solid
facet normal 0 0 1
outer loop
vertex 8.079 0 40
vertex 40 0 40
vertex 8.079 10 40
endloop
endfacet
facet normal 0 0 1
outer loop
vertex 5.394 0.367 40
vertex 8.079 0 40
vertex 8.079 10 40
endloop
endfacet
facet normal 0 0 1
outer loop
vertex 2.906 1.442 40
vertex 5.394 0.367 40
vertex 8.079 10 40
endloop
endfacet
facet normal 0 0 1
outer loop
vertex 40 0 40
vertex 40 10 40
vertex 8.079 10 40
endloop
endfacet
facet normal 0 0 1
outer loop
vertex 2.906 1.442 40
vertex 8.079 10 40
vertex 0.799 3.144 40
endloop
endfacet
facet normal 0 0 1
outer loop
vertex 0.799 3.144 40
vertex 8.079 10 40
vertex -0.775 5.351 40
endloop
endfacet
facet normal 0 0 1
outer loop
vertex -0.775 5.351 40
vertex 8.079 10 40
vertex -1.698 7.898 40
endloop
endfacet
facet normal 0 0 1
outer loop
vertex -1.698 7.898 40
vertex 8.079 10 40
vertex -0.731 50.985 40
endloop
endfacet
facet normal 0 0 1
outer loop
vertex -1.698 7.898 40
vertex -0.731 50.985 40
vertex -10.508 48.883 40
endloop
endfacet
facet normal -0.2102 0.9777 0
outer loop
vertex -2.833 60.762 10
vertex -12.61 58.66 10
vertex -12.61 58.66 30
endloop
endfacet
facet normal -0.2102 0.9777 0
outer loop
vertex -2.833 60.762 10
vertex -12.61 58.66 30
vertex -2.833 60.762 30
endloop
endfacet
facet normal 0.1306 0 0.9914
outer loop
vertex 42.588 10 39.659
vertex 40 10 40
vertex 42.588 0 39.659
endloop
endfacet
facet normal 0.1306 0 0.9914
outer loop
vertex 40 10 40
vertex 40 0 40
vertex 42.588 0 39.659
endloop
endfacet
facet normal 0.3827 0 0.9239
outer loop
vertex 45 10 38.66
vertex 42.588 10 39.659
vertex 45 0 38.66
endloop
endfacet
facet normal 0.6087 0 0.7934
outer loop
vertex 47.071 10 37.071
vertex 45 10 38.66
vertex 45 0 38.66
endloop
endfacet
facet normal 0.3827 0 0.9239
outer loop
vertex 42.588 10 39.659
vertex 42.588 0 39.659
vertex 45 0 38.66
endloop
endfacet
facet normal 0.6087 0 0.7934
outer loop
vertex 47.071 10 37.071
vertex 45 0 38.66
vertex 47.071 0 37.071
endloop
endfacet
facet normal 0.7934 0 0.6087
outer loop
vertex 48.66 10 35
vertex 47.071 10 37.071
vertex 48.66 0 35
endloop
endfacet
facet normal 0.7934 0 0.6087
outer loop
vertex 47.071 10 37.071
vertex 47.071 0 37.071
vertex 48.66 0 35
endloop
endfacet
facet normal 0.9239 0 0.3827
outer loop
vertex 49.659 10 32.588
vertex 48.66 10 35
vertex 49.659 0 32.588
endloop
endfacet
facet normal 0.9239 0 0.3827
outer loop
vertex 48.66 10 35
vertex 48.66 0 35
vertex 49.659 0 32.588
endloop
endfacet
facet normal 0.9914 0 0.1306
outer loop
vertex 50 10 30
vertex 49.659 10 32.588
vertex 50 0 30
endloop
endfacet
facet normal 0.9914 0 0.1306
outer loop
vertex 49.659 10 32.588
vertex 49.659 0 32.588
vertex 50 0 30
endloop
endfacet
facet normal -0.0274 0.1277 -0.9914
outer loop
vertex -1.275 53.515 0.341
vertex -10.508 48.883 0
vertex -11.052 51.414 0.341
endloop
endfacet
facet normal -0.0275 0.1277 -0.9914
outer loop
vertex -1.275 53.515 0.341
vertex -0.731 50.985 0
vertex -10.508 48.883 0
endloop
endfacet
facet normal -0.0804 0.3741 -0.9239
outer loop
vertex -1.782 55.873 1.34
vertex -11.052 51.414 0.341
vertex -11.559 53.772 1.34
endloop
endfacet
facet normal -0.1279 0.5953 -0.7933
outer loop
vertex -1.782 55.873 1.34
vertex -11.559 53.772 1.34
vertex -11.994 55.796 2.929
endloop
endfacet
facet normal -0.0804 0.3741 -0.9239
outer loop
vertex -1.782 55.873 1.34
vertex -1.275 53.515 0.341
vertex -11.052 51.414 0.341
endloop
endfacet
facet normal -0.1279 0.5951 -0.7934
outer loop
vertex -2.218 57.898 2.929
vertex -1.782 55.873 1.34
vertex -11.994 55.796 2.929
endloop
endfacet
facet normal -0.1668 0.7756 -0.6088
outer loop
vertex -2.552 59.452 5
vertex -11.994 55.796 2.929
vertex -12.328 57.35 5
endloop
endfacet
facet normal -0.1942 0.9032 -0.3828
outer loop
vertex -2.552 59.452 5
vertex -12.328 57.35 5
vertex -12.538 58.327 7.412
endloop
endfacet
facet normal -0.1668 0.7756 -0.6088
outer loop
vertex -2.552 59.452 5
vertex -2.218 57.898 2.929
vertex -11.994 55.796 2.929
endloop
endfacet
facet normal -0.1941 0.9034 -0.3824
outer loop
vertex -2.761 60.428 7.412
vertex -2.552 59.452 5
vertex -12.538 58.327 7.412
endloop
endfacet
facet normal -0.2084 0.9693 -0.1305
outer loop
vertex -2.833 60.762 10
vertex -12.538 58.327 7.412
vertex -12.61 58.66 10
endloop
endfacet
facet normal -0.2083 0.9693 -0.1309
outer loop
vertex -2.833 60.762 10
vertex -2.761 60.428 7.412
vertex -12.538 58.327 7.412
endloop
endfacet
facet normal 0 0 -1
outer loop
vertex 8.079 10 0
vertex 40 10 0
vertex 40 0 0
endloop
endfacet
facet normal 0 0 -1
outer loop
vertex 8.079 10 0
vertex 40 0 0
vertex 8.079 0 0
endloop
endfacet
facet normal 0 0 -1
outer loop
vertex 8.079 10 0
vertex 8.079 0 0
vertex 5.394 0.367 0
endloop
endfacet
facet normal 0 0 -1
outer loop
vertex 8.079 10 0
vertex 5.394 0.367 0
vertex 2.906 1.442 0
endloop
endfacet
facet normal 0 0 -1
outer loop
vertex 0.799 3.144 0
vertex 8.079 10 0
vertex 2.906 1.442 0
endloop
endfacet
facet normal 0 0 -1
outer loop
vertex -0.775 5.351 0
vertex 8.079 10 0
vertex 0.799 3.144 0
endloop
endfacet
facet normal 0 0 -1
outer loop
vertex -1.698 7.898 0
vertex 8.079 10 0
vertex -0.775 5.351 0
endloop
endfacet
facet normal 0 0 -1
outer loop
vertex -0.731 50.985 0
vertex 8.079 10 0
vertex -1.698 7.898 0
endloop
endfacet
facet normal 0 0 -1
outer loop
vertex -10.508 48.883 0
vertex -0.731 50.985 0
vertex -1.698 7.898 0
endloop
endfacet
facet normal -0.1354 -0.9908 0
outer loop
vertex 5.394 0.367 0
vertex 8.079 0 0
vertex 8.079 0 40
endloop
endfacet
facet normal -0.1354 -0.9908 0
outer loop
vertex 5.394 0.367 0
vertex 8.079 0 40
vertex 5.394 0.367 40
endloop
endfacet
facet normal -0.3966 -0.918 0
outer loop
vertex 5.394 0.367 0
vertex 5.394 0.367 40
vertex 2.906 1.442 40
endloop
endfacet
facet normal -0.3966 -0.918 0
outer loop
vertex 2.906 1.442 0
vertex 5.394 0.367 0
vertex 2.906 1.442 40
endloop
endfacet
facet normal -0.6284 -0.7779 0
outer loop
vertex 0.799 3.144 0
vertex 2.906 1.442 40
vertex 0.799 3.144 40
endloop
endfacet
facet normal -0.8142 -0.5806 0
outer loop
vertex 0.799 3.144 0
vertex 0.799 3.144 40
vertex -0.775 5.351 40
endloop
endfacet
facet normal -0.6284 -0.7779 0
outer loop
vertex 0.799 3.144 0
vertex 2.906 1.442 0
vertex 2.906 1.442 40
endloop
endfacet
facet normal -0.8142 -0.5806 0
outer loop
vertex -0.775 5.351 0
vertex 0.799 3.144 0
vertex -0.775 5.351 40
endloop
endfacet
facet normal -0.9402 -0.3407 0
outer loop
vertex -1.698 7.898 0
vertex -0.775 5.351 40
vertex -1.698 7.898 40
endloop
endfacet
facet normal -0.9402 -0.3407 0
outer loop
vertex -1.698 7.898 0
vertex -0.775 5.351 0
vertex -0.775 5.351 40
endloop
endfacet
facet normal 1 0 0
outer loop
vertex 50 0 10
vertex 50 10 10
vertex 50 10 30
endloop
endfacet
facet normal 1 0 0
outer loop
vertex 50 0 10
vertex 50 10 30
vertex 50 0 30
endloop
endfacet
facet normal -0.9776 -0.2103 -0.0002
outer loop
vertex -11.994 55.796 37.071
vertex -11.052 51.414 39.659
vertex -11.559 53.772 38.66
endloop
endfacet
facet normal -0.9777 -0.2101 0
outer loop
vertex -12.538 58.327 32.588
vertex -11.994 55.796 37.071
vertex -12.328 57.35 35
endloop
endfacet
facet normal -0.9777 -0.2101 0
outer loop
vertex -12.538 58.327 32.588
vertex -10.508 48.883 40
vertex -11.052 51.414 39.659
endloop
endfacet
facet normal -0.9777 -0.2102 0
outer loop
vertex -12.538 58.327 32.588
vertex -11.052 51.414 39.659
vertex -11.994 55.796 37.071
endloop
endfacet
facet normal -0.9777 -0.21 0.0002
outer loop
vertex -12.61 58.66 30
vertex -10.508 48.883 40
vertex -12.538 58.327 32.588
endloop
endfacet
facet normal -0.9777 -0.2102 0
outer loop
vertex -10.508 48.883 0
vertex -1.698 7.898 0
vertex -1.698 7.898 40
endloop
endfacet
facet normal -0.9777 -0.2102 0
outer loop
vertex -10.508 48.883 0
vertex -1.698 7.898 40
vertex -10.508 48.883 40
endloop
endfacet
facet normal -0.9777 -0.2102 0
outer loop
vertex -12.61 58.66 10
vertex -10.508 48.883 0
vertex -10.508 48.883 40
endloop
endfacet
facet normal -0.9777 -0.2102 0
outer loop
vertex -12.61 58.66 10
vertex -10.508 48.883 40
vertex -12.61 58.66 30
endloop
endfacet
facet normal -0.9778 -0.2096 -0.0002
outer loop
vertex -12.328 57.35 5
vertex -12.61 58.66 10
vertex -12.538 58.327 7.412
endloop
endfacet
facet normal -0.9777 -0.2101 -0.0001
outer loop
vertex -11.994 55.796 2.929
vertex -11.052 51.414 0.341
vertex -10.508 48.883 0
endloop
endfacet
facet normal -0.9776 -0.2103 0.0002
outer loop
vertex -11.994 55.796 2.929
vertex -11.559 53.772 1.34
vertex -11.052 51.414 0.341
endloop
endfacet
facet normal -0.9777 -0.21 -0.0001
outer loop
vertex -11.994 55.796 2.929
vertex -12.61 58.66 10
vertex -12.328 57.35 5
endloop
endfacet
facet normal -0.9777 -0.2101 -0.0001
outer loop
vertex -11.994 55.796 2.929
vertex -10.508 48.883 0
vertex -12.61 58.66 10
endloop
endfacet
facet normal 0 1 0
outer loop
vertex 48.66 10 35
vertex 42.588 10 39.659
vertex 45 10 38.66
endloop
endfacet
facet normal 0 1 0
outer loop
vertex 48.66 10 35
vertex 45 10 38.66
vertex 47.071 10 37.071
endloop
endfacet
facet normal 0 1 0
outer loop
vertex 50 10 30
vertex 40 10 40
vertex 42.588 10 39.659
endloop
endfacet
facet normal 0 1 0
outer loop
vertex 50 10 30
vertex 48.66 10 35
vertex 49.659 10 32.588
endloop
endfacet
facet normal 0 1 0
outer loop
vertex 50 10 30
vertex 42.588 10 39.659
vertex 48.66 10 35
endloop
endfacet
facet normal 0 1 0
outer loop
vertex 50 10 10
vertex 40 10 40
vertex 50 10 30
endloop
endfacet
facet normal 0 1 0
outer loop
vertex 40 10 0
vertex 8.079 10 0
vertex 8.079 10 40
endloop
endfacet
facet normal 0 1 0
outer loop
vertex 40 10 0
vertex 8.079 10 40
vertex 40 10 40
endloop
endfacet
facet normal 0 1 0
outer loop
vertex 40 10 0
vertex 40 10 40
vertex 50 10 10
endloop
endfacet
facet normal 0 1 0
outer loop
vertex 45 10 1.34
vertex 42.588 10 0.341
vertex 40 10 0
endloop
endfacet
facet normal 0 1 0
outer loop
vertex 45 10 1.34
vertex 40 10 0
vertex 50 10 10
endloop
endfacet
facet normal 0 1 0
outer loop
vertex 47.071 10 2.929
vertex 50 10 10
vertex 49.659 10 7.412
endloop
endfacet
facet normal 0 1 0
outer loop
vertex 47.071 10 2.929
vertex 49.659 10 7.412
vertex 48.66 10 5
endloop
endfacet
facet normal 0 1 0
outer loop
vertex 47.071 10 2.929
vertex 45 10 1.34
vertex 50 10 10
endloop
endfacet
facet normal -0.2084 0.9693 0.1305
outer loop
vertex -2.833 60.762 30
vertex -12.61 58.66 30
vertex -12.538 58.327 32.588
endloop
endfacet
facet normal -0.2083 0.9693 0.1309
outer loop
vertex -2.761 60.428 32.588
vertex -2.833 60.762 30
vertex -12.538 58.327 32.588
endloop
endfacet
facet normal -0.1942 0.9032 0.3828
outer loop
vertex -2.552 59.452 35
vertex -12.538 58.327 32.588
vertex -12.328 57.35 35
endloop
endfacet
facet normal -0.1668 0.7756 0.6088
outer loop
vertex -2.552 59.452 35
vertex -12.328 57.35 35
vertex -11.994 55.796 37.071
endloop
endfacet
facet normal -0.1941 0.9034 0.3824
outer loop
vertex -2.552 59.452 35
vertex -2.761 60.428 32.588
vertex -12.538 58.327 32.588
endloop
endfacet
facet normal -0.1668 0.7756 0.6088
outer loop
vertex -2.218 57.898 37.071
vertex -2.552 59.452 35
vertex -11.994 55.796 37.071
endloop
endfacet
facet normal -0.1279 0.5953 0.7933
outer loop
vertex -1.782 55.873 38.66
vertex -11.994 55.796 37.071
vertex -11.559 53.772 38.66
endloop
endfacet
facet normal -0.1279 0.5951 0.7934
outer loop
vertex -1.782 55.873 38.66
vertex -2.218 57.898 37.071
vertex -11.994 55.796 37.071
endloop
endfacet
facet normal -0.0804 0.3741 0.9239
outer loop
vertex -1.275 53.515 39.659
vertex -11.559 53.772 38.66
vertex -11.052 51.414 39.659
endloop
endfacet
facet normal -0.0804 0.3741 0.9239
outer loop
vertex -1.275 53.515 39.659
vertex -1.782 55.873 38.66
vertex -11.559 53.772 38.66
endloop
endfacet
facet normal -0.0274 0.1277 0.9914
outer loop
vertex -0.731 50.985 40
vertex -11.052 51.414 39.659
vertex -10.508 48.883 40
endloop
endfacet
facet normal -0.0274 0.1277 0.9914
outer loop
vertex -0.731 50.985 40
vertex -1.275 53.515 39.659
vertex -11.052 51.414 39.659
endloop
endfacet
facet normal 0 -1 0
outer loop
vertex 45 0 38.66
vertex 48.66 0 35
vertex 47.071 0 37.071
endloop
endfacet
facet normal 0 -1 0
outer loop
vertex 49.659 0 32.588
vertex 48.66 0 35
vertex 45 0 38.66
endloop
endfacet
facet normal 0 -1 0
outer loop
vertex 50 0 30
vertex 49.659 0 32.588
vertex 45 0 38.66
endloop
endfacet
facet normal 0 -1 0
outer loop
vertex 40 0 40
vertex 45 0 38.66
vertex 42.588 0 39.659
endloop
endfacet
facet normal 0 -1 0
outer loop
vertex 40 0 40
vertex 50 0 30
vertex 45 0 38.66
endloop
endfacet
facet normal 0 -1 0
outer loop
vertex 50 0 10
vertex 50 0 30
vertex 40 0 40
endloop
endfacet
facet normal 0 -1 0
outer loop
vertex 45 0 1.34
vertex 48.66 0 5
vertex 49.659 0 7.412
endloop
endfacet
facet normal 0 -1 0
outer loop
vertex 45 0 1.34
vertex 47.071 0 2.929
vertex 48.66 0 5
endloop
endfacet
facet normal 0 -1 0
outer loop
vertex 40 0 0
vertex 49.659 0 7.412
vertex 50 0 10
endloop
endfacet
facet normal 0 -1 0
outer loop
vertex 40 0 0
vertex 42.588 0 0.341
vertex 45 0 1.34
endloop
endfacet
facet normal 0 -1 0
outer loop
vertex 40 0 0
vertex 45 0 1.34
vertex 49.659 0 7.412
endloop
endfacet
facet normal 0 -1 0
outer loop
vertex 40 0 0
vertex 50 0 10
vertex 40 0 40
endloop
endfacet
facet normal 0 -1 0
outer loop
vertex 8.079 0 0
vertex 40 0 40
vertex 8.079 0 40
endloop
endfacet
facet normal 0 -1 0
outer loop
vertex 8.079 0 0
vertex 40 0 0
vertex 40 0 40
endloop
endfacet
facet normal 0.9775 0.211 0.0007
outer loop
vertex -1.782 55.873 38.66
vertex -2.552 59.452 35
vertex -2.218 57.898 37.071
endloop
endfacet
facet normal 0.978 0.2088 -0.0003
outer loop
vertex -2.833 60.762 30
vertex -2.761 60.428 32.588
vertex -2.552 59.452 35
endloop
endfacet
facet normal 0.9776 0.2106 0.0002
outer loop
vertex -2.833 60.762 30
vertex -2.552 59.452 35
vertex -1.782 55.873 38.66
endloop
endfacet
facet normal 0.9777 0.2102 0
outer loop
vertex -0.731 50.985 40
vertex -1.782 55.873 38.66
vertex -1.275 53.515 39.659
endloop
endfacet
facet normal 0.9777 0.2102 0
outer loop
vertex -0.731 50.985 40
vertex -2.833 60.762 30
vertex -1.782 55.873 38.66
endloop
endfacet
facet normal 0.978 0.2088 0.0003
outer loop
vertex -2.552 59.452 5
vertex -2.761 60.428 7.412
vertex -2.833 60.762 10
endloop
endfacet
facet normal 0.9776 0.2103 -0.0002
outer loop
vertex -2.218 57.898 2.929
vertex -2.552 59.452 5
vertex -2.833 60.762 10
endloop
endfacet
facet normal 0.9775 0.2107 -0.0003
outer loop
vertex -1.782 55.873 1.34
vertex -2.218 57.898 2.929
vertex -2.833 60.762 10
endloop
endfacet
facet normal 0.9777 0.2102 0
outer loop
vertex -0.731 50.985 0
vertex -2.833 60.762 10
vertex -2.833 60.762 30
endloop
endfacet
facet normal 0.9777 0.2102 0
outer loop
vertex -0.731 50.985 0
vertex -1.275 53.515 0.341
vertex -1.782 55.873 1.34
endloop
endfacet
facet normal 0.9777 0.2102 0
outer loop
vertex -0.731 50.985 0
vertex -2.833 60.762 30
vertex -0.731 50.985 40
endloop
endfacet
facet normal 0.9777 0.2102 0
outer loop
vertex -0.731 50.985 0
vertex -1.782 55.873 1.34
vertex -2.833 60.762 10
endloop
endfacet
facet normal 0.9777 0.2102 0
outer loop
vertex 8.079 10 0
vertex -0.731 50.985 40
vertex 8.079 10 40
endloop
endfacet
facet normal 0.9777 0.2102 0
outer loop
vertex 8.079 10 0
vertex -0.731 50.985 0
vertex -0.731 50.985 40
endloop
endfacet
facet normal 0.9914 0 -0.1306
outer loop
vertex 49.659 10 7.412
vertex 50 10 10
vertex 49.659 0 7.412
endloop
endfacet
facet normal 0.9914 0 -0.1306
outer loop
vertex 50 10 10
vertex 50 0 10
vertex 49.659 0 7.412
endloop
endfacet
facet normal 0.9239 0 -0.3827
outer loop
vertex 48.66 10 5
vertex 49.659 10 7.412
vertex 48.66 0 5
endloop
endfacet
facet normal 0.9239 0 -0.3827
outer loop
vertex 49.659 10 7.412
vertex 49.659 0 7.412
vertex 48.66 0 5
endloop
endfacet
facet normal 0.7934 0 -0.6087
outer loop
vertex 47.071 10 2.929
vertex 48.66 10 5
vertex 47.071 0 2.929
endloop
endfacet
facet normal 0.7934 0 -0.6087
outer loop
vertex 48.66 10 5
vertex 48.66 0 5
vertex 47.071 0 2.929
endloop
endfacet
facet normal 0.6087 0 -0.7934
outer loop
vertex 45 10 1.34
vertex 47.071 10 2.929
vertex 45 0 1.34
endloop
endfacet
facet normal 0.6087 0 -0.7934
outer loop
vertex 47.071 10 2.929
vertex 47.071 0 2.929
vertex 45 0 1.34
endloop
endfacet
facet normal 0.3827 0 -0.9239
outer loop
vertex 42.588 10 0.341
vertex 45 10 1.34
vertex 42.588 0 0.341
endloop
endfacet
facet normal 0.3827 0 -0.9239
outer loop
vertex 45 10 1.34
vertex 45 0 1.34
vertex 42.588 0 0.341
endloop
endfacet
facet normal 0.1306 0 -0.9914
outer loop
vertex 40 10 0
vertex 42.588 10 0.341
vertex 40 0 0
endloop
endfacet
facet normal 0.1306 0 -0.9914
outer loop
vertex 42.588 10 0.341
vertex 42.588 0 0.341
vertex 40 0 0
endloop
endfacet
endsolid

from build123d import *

# Parameters (mm, degrees)
EXTRUDE_THIN1_DEPTH = 40
FILLET1_R           = 10
FILLET2_R           = 10
FILLET3_R           = 10
FILLET4_R           = 10


with BuildPart() as part:
    # Sketch1 → Extrude-Thin1 (new body)
    with BuildSketch(Plane.XY):
        with BuildLine():
            Line((50, 0), (8.078800395, 0))
            ThreePointArc((8.078800395, 0), (1.794545597, 2.221302061), (-1.697863575, 7.898371675))
            Line((-1.697863575, 7.898371675), (-12.609769953, 58.65998382))
            Line((-12.609769953, 58.65998382), (-2.833105983, 60.761612145))
            Line((-2.833105983, 60.761612145), (8.078800395, 10))
            Line((8.078800395, 10), (50, 10))
            Line((50, 10), (50, 0))
        make_face()
    extrude(amount=EXTRUDE_THIN1_DEPTH)

    # Fillet1
    fillet1_edges = [part.edges().sort_by_distance(p)[0] for p in [
        (-7.721437968, 59.710797982, 40),
    ]]
    fillet(fillet1_edges, radius=FILLET1_R)

    # Fillet2
    fillet2_edges = [part.edges().sort_by_distance(p)[0] for p in [
        (50, 5, 40),
    ]]
    fillet(fillet2_edges, radius=FILLET2_R)

    # Fillet3
    fillet3_edges = [part.edges().sort_by_distance(p)[0] for p in [
        (50, 5, 0),
    ]]
    fillet(fillet3_edges, radius=FILLET3_R)

    # Fillet4
    fillet4_edges = [part.edges().sort_by_distance(p)[0] for p in [
        (-7.721437968, 59.710797982, 0),
    ]]
    fillet(fillet4_edges, radius=FILLET4_R)


solid = part.part
